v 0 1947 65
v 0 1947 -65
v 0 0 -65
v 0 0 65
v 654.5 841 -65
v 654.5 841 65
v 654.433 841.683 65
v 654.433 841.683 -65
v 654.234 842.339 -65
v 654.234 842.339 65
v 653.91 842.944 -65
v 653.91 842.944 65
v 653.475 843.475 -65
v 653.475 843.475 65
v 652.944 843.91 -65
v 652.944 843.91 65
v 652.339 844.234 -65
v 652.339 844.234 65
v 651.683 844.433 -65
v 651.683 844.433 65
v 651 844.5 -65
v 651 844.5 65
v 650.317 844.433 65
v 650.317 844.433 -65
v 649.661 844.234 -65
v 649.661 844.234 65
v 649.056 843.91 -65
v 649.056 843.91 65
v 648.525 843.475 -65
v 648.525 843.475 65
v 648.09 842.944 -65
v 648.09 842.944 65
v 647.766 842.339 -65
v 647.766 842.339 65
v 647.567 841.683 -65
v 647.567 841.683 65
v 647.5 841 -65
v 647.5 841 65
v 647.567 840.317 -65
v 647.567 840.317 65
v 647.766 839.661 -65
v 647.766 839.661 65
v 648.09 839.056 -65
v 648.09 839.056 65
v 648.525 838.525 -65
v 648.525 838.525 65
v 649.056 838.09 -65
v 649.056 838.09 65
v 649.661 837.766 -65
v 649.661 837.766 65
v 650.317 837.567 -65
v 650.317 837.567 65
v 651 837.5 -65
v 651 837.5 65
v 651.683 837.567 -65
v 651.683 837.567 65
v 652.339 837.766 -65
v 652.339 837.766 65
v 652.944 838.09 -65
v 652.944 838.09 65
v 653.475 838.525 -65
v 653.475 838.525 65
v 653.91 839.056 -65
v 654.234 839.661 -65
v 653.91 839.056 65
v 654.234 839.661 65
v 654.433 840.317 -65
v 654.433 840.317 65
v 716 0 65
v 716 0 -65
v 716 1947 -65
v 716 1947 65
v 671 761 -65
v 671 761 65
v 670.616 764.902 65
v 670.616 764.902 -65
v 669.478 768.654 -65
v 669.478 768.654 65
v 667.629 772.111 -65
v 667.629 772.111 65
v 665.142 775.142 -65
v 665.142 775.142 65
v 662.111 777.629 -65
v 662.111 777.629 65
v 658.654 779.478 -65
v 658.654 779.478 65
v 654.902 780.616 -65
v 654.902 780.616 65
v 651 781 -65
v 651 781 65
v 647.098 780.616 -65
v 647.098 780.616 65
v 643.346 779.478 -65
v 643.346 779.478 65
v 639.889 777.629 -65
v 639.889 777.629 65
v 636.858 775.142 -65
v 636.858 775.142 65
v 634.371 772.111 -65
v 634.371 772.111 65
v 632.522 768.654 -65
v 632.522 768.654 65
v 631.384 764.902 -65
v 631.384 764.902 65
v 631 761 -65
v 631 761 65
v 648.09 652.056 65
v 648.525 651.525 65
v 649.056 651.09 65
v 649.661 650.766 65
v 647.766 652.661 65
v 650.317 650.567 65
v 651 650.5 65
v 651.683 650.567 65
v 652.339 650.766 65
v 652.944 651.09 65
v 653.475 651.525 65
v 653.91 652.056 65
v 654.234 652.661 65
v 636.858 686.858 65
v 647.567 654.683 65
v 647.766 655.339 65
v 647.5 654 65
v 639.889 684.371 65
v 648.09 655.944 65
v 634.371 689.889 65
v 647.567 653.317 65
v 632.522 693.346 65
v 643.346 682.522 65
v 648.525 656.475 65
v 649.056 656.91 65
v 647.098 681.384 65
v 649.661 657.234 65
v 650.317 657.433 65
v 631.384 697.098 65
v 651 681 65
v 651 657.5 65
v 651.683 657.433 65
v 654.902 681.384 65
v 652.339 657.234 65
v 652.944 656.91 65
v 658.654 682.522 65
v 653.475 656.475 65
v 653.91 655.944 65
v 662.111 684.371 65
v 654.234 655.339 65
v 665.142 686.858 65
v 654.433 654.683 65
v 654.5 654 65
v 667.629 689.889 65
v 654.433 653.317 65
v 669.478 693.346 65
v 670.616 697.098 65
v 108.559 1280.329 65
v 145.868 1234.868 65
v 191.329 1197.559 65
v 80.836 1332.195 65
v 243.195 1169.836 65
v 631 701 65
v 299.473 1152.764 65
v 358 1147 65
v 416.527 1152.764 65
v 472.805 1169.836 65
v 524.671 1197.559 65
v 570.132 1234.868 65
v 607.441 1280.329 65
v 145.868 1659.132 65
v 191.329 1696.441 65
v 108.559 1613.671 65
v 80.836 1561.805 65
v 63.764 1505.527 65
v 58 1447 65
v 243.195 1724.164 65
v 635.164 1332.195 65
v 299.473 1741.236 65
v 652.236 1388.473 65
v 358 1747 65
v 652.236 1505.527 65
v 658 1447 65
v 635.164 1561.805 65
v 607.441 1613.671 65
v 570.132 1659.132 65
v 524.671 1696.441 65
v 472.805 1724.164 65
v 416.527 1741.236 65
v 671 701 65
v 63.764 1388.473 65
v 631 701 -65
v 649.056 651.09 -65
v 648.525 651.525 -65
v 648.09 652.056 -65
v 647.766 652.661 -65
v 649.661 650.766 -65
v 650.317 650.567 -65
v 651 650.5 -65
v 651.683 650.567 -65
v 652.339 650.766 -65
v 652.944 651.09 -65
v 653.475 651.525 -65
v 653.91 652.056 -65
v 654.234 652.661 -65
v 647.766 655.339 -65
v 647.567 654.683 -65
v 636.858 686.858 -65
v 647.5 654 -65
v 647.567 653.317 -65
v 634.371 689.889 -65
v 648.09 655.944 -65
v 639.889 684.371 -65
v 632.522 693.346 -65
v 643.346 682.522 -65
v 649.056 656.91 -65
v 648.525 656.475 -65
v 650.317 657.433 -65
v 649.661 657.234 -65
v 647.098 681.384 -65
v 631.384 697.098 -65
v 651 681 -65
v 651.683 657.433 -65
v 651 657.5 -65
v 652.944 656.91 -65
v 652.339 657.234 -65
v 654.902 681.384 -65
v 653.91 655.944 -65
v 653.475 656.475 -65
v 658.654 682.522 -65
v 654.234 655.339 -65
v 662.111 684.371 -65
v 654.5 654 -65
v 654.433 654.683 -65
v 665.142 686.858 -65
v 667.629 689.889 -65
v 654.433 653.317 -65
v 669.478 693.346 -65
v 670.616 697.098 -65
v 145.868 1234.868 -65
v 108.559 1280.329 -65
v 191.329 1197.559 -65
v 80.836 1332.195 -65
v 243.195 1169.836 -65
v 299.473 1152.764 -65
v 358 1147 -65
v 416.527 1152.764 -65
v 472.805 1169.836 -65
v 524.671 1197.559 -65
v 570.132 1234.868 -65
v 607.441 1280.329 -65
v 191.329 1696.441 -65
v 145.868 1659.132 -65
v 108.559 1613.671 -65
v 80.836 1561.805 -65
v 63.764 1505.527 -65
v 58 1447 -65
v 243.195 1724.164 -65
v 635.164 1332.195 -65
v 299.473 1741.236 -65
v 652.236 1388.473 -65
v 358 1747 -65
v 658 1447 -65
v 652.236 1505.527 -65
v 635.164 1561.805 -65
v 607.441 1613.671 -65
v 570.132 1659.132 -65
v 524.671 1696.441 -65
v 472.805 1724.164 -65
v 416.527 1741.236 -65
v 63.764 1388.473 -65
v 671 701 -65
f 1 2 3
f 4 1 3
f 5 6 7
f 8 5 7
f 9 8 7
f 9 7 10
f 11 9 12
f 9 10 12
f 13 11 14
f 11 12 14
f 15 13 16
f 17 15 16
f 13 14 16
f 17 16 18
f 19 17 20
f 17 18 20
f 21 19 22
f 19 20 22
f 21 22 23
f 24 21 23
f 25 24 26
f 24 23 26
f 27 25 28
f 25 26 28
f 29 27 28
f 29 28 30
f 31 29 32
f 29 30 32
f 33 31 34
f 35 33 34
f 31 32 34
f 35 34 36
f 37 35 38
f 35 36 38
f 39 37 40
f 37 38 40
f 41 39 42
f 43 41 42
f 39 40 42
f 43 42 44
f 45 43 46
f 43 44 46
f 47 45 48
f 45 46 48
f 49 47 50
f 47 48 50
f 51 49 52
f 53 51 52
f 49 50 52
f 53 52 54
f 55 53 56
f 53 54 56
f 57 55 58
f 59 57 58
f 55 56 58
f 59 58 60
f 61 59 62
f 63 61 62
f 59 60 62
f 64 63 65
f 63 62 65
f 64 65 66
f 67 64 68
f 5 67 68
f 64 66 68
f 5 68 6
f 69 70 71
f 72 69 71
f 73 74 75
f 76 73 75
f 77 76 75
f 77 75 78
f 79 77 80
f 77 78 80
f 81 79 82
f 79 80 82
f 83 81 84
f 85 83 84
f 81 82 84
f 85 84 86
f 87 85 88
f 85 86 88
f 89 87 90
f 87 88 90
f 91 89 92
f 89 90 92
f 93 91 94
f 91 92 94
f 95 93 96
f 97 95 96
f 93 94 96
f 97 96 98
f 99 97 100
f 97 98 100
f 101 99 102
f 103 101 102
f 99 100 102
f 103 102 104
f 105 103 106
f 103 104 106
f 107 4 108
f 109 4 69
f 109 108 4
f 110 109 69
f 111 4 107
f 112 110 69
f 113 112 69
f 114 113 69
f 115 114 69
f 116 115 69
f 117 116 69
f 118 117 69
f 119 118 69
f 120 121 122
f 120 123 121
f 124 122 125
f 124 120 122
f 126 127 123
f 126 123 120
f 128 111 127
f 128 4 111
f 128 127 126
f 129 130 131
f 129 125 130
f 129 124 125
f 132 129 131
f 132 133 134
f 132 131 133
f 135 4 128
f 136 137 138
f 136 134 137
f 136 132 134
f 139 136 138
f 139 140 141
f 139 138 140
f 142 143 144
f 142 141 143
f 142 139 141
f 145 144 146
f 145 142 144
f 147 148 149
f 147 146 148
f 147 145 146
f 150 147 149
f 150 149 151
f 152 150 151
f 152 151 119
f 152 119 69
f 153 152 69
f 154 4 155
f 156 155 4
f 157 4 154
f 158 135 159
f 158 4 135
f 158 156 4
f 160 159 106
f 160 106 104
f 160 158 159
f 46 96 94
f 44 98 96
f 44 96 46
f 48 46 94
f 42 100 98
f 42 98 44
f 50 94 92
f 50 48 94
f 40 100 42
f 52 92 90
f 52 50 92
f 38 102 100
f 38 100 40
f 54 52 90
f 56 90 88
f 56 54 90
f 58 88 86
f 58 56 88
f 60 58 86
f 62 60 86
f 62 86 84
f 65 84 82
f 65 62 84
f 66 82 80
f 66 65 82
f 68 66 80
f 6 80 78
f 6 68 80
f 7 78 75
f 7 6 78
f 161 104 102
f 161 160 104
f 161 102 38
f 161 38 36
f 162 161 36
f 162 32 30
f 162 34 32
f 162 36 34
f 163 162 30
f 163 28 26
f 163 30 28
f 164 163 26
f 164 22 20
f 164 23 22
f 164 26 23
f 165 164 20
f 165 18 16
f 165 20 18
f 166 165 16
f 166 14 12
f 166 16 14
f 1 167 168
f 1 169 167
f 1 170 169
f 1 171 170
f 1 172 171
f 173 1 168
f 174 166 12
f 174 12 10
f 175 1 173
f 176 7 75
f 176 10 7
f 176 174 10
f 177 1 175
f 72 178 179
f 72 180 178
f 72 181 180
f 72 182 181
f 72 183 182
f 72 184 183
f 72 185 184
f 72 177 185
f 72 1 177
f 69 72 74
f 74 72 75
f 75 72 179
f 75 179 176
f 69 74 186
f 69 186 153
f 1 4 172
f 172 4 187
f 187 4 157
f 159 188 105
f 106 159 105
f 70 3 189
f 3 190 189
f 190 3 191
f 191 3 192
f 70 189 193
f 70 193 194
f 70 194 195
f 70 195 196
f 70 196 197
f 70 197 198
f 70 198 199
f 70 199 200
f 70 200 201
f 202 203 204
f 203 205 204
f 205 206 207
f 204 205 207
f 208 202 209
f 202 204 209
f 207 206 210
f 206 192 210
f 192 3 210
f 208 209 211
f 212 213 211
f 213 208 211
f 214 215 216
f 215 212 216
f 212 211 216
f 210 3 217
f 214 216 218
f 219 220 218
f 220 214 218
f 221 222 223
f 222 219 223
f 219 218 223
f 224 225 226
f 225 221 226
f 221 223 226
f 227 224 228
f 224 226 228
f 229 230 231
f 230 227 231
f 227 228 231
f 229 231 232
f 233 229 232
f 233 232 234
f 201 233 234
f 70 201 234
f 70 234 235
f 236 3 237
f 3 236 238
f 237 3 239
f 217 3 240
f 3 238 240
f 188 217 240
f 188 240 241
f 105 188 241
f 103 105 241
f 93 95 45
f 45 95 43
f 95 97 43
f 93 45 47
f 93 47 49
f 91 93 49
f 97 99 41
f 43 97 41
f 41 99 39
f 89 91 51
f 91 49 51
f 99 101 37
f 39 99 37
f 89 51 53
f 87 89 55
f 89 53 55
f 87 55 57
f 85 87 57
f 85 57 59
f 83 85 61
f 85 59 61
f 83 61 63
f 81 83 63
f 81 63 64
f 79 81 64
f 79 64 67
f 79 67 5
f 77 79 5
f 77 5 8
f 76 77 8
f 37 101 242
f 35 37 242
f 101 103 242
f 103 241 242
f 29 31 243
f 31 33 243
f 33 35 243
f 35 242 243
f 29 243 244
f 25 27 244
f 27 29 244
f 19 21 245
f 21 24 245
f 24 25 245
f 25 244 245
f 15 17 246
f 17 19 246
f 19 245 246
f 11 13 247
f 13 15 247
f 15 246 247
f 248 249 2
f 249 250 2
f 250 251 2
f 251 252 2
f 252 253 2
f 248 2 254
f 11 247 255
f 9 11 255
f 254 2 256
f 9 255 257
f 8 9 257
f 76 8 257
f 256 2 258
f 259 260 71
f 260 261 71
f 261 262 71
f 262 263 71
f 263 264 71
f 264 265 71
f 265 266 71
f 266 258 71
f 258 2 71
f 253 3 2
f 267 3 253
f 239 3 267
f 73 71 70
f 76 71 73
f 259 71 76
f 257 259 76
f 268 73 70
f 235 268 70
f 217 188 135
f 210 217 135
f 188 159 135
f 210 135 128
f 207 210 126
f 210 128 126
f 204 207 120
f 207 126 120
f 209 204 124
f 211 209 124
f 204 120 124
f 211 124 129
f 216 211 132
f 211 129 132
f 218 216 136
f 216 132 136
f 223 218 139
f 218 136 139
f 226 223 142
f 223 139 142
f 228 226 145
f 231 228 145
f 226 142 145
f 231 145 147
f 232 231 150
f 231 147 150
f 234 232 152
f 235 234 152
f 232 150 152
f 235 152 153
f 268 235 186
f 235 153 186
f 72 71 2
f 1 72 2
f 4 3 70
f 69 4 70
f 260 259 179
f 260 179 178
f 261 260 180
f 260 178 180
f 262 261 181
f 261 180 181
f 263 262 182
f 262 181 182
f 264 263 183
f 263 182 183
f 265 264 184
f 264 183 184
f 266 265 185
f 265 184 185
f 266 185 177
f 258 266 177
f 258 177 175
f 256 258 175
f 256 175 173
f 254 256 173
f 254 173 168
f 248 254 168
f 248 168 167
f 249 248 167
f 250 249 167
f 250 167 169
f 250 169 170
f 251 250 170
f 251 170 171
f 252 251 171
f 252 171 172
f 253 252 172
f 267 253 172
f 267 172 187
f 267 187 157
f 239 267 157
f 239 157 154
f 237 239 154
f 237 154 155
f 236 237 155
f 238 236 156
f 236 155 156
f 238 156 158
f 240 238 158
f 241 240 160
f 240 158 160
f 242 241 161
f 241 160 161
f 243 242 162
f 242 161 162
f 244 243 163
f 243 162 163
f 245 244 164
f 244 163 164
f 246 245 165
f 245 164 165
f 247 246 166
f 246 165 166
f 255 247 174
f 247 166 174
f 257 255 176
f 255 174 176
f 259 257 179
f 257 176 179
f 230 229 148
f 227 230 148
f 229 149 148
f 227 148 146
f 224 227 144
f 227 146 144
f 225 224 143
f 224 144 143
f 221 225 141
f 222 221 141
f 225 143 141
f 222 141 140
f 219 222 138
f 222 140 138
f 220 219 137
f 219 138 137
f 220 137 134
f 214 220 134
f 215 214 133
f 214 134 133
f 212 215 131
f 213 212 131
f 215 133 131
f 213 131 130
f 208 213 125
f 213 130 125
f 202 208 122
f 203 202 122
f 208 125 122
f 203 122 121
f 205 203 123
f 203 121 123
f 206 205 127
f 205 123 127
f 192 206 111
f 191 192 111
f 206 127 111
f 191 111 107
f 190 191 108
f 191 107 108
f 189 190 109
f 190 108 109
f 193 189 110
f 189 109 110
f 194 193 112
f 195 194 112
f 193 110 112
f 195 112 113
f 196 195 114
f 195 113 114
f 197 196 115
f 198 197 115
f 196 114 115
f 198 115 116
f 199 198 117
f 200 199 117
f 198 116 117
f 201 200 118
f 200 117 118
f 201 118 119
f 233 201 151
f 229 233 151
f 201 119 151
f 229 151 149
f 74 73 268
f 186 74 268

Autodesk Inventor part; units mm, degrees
ref_plane "YZ Plane" through (0, 0, 0) normal (1, 0, 0) x (0, 1, 0)
ref_plane "XZ Plane" through (0, 0, 0) normal (0, 1, 0) x (-1, 0, 0)
ref_plane "XY Plane" through (0, 0, 0) normal (0, 0, 1) x (1, 0, 0)
sketch "Sketch6" plane through (0, 0, 0) normal (0, 0, 1) x (1, 0, 0)
  line L0 (0, 0) -> (716, 0)
  line L1 (716, 0) -> (716, 1947)
  line L2 (716, 1947) -> (0, 1947)
  line L3 (0, 1947) -> (0, 0)
  dimension "d0" = 716
  dimension "d1" = 1947
extrude "Extrusion1" add sketch "Sketch6" along normal mid plane 130
sketch "Sketch7" plane through (0, 0, 65) normal (0, 0, 1) x (1, 0, 0)
  circle A0 centre (358, 1447) radius 300
  line L0 (716, 1947) -> (0, 1947) projected
  point P0 (0, 0)
  point P1 (358, 1947)
  dimension "d4" = 600
  dimension "d5" = 500
extrude "Extrusion2" cut sketch "Sketch7" against normal up to surface (130 mm away)
sketch "Sketch9" plane through (0, 0, 65) normal (0, 0, 1) x (1, 0, 0)
  line L0 (651, 761) -> (651, 701) construction
  line L1 (671, 761) -> (671, 701)
  line L2 (631, 701) -> (631, 761)
  arc A0 (671, 761) -> (631, 761) centre (651, 761) ccw
  arc A1 (631, 701) -> (671, 701) centre (651, 701) ccw
  line L3 (0, 0) -> (716, 0) projected
  line L4 (0, 1947) -> (0, 0) projected
  circle A2 centre (651, 841) radius 3.5
  circle A3 centre (651, 654) radius 3.5
  line L5 (716, 0) -> (716, 1947) projected
  point P0 (651, 731)
  point P1 (651, 681)
  point P2 (651, 781)
  dimension "d8" = 40
  dimension "d9" = 681
  dimension "d10" = 100
  dimension "d12" = 7
  dimension "d13" = 60
  dimension "d14" = 7
  dimension "d15" = 187
  dimension "d18" = 65
extrude "Extrusion3" cut sketch "Sketch9" against normal up to surface (130 mm away)
equation "\"d0\" = SchuBrei"
equation "\"d1\" = SchuHoeh"
equation "\"d2\" = SchuDick"
equation "\"SchuDick\" = 130"
equation "\"SchuBrei\" = 716"
equation "\"SchuHoeh\" = 1947"
properties part number "Schutz"
